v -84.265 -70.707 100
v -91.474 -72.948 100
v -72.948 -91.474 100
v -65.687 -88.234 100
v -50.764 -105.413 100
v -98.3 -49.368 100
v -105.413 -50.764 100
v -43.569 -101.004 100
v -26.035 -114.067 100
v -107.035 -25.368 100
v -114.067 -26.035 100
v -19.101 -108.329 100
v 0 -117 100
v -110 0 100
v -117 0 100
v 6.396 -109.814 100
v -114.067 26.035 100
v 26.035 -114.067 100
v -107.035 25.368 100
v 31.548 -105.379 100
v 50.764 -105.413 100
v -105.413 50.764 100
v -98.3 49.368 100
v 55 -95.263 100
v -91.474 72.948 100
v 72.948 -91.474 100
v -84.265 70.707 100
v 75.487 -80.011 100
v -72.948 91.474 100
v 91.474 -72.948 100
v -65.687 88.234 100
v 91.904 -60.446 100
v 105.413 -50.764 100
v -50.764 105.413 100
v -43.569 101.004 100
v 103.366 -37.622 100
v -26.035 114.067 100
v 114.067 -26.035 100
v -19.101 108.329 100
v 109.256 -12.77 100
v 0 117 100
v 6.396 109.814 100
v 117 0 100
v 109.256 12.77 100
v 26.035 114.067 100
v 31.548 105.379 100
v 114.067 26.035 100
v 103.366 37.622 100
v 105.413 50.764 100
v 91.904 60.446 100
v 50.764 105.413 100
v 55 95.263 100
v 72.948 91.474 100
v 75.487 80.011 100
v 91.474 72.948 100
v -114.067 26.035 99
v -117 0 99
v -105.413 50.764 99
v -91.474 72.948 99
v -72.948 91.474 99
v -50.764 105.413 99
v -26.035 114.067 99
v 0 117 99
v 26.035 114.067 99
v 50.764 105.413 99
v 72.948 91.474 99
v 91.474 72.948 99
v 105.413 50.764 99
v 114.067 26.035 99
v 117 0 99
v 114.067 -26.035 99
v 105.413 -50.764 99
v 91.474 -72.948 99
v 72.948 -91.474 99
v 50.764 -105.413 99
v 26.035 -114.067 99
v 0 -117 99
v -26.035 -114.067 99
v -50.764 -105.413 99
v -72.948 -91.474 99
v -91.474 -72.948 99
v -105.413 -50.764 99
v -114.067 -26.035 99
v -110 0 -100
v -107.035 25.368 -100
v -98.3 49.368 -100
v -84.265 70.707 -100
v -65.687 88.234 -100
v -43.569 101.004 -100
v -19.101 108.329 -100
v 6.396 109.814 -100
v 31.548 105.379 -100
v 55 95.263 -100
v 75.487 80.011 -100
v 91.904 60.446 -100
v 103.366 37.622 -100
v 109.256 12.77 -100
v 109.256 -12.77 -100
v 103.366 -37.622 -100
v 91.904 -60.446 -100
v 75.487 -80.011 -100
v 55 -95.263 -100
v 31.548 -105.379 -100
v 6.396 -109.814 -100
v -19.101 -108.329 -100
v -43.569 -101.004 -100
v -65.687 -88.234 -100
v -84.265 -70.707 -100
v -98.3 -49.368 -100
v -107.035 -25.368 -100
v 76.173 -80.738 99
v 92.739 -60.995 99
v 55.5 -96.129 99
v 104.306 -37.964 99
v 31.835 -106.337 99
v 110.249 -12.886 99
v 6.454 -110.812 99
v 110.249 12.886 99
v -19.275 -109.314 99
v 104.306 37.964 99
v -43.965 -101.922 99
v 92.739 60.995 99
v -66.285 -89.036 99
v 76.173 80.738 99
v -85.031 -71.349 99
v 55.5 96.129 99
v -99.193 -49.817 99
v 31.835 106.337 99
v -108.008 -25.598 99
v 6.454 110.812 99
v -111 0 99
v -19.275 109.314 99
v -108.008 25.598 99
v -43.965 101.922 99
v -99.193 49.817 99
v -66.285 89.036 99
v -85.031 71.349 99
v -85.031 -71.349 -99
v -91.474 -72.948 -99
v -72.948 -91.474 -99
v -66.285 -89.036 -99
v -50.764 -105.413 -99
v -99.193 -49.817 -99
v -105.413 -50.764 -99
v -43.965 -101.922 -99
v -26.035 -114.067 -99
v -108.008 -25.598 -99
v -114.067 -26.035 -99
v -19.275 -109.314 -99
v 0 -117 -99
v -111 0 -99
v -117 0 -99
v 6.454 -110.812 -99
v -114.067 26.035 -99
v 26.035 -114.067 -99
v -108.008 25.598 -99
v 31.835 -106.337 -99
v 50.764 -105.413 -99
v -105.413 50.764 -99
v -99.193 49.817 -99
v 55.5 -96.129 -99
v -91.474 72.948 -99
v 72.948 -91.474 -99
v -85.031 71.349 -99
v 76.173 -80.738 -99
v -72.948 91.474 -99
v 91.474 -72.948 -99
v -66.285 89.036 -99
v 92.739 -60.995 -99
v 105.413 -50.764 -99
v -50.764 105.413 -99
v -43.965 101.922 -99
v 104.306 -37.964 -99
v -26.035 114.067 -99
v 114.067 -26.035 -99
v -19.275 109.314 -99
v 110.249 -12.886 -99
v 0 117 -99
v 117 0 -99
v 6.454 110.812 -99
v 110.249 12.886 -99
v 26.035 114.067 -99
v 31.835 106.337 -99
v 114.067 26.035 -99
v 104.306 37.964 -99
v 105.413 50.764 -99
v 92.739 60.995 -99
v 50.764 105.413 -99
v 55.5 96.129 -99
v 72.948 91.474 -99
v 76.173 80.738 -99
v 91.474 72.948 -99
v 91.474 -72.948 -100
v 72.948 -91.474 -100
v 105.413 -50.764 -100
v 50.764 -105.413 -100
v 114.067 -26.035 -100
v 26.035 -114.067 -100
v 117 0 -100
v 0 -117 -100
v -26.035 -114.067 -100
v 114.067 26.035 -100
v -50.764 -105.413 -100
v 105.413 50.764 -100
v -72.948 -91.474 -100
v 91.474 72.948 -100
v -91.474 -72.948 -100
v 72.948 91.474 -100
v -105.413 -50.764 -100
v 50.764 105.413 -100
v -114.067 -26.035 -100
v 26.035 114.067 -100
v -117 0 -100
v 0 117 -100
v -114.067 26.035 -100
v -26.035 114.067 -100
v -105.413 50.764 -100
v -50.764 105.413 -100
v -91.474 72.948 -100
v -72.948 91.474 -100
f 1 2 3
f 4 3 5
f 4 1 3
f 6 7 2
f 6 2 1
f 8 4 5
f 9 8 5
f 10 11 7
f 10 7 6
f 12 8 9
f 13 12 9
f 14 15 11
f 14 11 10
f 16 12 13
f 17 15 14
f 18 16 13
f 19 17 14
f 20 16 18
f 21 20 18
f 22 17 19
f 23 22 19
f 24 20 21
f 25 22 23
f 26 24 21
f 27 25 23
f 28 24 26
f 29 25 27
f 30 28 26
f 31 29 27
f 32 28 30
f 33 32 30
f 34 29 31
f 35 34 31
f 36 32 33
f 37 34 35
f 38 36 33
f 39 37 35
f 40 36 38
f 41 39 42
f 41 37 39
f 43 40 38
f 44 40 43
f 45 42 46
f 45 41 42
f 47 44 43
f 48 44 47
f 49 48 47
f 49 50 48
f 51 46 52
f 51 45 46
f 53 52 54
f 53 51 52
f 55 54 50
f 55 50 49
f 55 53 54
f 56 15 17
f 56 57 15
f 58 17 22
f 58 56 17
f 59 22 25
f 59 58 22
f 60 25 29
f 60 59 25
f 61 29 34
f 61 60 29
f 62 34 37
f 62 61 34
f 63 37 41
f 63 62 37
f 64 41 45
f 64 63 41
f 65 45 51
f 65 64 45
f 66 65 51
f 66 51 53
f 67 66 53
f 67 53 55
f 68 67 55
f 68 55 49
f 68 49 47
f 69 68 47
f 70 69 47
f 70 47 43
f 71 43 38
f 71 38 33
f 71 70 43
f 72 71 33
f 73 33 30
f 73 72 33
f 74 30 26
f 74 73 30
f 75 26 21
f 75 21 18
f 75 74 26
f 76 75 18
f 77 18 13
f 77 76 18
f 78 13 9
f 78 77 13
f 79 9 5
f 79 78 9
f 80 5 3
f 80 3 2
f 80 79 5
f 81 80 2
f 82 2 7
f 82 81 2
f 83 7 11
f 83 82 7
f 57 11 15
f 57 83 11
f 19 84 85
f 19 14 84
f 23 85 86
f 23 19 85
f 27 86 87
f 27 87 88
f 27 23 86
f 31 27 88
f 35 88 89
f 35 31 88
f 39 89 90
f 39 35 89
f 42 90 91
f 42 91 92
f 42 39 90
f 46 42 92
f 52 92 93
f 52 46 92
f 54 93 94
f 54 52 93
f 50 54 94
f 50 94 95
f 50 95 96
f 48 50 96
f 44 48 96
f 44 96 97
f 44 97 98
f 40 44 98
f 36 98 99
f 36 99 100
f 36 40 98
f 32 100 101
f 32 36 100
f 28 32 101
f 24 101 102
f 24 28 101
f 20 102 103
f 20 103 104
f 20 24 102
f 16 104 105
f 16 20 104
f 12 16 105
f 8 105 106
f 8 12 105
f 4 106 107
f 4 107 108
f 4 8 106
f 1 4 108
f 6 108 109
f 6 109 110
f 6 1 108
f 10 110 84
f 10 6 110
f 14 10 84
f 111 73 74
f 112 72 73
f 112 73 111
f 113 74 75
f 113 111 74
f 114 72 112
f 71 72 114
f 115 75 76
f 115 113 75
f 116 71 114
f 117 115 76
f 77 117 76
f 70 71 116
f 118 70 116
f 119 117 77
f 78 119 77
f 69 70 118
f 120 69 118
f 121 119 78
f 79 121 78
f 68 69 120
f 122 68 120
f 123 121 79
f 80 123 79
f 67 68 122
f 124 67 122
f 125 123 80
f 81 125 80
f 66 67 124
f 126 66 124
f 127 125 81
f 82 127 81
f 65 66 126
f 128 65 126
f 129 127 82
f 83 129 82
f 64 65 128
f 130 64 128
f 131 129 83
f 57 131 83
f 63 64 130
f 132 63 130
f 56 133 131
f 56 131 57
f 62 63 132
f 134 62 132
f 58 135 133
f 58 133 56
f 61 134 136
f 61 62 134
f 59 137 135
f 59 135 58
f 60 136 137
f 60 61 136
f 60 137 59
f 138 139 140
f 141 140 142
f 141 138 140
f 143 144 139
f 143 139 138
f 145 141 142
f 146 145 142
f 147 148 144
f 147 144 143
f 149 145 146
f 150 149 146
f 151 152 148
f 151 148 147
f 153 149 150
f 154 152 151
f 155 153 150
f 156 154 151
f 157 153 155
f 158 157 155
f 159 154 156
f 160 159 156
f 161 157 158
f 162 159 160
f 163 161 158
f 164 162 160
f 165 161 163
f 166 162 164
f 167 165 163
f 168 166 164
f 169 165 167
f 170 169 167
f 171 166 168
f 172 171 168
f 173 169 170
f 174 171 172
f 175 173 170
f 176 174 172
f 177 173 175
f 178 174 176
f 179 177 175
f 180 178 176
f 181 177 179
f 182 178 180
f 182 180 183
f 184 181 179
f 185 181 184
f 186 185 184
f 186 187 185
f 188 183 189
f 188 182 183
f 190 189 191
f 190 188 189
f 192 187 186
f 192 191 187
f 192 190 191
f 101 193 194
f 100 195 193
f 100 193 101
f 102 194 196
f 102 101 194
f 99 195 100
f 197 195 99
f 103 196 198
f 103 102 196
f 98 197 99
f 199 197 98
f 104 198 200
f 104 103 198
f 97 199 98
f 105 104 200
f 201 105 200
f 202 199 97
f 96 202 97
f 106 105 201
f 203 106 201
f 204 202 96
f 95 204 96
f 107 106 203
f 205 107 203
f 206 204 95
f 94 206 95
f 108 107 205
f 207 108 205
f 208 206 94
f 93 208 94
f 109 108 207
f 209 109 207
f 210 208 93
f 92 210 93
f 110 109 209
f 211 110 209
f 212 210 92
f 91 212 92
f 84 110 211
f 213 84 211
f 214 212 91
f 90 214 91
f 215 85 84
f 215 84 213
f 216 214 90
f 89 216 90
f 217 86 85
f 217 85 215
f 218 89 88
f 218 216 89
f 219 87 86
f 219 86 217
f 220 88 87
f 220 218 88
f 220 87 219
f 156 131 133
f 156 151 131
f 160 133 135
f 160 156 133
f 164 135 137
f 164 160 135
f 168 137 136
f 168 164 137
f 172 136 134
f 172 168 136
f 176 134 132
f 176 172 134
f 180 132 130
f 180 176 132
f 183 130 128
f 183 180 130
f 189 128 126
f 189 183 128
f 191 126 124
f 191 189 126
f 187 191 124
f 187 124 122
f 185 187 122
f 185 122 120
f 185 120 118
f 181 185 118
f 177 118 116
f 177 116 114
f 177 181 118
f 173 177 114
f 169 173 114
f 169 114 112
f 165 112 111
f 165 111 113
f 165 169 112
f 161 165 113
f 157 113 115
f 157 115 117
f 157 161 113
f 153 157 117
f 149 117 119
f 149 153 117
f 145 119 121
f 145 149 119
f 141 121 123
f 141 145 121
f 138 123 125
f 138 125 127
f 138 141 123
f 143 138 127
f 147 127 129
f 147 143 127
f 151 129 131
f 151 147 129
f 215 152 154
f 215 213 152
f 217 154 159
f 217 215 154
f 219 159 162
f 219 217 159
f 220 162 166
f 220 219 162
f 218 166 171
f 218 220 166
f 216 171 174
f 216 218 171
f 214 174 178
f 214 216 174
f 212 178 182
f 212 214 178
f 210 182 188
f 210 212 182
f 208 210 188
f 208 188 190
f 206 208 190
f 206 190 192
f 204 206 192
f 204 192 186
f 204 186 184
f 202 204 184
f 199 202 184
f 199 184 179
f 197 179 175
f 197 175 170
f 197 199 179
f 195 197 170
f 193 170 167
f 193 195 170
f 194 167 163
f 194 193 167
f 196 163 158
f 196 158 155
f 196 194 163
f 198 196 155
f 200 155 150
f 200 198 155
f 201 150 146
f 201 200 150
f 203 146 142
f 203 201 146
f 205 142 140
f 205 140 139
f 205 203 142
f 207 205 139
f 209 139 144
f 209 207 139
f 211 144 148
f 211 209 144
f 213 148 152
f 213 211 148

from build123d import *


with BuildPart() as f1:
    # F0 (on Front) → F1 (revolve)
    with BuildSketch(Plane.XZ):
        Polygon((-110, 0), (-110, 100), (-117, 100), (-117, 99), (-111, 99), (-111, 0), align=None)
        Polygon((-110, -100), (-110, 0), (-111, 0), (-111, -99), (-117, -99), (-117, -100), align=None)
    revolve(axis=Axis((0, 0, 50), (0, 0, -1)))


solid = f1.part
